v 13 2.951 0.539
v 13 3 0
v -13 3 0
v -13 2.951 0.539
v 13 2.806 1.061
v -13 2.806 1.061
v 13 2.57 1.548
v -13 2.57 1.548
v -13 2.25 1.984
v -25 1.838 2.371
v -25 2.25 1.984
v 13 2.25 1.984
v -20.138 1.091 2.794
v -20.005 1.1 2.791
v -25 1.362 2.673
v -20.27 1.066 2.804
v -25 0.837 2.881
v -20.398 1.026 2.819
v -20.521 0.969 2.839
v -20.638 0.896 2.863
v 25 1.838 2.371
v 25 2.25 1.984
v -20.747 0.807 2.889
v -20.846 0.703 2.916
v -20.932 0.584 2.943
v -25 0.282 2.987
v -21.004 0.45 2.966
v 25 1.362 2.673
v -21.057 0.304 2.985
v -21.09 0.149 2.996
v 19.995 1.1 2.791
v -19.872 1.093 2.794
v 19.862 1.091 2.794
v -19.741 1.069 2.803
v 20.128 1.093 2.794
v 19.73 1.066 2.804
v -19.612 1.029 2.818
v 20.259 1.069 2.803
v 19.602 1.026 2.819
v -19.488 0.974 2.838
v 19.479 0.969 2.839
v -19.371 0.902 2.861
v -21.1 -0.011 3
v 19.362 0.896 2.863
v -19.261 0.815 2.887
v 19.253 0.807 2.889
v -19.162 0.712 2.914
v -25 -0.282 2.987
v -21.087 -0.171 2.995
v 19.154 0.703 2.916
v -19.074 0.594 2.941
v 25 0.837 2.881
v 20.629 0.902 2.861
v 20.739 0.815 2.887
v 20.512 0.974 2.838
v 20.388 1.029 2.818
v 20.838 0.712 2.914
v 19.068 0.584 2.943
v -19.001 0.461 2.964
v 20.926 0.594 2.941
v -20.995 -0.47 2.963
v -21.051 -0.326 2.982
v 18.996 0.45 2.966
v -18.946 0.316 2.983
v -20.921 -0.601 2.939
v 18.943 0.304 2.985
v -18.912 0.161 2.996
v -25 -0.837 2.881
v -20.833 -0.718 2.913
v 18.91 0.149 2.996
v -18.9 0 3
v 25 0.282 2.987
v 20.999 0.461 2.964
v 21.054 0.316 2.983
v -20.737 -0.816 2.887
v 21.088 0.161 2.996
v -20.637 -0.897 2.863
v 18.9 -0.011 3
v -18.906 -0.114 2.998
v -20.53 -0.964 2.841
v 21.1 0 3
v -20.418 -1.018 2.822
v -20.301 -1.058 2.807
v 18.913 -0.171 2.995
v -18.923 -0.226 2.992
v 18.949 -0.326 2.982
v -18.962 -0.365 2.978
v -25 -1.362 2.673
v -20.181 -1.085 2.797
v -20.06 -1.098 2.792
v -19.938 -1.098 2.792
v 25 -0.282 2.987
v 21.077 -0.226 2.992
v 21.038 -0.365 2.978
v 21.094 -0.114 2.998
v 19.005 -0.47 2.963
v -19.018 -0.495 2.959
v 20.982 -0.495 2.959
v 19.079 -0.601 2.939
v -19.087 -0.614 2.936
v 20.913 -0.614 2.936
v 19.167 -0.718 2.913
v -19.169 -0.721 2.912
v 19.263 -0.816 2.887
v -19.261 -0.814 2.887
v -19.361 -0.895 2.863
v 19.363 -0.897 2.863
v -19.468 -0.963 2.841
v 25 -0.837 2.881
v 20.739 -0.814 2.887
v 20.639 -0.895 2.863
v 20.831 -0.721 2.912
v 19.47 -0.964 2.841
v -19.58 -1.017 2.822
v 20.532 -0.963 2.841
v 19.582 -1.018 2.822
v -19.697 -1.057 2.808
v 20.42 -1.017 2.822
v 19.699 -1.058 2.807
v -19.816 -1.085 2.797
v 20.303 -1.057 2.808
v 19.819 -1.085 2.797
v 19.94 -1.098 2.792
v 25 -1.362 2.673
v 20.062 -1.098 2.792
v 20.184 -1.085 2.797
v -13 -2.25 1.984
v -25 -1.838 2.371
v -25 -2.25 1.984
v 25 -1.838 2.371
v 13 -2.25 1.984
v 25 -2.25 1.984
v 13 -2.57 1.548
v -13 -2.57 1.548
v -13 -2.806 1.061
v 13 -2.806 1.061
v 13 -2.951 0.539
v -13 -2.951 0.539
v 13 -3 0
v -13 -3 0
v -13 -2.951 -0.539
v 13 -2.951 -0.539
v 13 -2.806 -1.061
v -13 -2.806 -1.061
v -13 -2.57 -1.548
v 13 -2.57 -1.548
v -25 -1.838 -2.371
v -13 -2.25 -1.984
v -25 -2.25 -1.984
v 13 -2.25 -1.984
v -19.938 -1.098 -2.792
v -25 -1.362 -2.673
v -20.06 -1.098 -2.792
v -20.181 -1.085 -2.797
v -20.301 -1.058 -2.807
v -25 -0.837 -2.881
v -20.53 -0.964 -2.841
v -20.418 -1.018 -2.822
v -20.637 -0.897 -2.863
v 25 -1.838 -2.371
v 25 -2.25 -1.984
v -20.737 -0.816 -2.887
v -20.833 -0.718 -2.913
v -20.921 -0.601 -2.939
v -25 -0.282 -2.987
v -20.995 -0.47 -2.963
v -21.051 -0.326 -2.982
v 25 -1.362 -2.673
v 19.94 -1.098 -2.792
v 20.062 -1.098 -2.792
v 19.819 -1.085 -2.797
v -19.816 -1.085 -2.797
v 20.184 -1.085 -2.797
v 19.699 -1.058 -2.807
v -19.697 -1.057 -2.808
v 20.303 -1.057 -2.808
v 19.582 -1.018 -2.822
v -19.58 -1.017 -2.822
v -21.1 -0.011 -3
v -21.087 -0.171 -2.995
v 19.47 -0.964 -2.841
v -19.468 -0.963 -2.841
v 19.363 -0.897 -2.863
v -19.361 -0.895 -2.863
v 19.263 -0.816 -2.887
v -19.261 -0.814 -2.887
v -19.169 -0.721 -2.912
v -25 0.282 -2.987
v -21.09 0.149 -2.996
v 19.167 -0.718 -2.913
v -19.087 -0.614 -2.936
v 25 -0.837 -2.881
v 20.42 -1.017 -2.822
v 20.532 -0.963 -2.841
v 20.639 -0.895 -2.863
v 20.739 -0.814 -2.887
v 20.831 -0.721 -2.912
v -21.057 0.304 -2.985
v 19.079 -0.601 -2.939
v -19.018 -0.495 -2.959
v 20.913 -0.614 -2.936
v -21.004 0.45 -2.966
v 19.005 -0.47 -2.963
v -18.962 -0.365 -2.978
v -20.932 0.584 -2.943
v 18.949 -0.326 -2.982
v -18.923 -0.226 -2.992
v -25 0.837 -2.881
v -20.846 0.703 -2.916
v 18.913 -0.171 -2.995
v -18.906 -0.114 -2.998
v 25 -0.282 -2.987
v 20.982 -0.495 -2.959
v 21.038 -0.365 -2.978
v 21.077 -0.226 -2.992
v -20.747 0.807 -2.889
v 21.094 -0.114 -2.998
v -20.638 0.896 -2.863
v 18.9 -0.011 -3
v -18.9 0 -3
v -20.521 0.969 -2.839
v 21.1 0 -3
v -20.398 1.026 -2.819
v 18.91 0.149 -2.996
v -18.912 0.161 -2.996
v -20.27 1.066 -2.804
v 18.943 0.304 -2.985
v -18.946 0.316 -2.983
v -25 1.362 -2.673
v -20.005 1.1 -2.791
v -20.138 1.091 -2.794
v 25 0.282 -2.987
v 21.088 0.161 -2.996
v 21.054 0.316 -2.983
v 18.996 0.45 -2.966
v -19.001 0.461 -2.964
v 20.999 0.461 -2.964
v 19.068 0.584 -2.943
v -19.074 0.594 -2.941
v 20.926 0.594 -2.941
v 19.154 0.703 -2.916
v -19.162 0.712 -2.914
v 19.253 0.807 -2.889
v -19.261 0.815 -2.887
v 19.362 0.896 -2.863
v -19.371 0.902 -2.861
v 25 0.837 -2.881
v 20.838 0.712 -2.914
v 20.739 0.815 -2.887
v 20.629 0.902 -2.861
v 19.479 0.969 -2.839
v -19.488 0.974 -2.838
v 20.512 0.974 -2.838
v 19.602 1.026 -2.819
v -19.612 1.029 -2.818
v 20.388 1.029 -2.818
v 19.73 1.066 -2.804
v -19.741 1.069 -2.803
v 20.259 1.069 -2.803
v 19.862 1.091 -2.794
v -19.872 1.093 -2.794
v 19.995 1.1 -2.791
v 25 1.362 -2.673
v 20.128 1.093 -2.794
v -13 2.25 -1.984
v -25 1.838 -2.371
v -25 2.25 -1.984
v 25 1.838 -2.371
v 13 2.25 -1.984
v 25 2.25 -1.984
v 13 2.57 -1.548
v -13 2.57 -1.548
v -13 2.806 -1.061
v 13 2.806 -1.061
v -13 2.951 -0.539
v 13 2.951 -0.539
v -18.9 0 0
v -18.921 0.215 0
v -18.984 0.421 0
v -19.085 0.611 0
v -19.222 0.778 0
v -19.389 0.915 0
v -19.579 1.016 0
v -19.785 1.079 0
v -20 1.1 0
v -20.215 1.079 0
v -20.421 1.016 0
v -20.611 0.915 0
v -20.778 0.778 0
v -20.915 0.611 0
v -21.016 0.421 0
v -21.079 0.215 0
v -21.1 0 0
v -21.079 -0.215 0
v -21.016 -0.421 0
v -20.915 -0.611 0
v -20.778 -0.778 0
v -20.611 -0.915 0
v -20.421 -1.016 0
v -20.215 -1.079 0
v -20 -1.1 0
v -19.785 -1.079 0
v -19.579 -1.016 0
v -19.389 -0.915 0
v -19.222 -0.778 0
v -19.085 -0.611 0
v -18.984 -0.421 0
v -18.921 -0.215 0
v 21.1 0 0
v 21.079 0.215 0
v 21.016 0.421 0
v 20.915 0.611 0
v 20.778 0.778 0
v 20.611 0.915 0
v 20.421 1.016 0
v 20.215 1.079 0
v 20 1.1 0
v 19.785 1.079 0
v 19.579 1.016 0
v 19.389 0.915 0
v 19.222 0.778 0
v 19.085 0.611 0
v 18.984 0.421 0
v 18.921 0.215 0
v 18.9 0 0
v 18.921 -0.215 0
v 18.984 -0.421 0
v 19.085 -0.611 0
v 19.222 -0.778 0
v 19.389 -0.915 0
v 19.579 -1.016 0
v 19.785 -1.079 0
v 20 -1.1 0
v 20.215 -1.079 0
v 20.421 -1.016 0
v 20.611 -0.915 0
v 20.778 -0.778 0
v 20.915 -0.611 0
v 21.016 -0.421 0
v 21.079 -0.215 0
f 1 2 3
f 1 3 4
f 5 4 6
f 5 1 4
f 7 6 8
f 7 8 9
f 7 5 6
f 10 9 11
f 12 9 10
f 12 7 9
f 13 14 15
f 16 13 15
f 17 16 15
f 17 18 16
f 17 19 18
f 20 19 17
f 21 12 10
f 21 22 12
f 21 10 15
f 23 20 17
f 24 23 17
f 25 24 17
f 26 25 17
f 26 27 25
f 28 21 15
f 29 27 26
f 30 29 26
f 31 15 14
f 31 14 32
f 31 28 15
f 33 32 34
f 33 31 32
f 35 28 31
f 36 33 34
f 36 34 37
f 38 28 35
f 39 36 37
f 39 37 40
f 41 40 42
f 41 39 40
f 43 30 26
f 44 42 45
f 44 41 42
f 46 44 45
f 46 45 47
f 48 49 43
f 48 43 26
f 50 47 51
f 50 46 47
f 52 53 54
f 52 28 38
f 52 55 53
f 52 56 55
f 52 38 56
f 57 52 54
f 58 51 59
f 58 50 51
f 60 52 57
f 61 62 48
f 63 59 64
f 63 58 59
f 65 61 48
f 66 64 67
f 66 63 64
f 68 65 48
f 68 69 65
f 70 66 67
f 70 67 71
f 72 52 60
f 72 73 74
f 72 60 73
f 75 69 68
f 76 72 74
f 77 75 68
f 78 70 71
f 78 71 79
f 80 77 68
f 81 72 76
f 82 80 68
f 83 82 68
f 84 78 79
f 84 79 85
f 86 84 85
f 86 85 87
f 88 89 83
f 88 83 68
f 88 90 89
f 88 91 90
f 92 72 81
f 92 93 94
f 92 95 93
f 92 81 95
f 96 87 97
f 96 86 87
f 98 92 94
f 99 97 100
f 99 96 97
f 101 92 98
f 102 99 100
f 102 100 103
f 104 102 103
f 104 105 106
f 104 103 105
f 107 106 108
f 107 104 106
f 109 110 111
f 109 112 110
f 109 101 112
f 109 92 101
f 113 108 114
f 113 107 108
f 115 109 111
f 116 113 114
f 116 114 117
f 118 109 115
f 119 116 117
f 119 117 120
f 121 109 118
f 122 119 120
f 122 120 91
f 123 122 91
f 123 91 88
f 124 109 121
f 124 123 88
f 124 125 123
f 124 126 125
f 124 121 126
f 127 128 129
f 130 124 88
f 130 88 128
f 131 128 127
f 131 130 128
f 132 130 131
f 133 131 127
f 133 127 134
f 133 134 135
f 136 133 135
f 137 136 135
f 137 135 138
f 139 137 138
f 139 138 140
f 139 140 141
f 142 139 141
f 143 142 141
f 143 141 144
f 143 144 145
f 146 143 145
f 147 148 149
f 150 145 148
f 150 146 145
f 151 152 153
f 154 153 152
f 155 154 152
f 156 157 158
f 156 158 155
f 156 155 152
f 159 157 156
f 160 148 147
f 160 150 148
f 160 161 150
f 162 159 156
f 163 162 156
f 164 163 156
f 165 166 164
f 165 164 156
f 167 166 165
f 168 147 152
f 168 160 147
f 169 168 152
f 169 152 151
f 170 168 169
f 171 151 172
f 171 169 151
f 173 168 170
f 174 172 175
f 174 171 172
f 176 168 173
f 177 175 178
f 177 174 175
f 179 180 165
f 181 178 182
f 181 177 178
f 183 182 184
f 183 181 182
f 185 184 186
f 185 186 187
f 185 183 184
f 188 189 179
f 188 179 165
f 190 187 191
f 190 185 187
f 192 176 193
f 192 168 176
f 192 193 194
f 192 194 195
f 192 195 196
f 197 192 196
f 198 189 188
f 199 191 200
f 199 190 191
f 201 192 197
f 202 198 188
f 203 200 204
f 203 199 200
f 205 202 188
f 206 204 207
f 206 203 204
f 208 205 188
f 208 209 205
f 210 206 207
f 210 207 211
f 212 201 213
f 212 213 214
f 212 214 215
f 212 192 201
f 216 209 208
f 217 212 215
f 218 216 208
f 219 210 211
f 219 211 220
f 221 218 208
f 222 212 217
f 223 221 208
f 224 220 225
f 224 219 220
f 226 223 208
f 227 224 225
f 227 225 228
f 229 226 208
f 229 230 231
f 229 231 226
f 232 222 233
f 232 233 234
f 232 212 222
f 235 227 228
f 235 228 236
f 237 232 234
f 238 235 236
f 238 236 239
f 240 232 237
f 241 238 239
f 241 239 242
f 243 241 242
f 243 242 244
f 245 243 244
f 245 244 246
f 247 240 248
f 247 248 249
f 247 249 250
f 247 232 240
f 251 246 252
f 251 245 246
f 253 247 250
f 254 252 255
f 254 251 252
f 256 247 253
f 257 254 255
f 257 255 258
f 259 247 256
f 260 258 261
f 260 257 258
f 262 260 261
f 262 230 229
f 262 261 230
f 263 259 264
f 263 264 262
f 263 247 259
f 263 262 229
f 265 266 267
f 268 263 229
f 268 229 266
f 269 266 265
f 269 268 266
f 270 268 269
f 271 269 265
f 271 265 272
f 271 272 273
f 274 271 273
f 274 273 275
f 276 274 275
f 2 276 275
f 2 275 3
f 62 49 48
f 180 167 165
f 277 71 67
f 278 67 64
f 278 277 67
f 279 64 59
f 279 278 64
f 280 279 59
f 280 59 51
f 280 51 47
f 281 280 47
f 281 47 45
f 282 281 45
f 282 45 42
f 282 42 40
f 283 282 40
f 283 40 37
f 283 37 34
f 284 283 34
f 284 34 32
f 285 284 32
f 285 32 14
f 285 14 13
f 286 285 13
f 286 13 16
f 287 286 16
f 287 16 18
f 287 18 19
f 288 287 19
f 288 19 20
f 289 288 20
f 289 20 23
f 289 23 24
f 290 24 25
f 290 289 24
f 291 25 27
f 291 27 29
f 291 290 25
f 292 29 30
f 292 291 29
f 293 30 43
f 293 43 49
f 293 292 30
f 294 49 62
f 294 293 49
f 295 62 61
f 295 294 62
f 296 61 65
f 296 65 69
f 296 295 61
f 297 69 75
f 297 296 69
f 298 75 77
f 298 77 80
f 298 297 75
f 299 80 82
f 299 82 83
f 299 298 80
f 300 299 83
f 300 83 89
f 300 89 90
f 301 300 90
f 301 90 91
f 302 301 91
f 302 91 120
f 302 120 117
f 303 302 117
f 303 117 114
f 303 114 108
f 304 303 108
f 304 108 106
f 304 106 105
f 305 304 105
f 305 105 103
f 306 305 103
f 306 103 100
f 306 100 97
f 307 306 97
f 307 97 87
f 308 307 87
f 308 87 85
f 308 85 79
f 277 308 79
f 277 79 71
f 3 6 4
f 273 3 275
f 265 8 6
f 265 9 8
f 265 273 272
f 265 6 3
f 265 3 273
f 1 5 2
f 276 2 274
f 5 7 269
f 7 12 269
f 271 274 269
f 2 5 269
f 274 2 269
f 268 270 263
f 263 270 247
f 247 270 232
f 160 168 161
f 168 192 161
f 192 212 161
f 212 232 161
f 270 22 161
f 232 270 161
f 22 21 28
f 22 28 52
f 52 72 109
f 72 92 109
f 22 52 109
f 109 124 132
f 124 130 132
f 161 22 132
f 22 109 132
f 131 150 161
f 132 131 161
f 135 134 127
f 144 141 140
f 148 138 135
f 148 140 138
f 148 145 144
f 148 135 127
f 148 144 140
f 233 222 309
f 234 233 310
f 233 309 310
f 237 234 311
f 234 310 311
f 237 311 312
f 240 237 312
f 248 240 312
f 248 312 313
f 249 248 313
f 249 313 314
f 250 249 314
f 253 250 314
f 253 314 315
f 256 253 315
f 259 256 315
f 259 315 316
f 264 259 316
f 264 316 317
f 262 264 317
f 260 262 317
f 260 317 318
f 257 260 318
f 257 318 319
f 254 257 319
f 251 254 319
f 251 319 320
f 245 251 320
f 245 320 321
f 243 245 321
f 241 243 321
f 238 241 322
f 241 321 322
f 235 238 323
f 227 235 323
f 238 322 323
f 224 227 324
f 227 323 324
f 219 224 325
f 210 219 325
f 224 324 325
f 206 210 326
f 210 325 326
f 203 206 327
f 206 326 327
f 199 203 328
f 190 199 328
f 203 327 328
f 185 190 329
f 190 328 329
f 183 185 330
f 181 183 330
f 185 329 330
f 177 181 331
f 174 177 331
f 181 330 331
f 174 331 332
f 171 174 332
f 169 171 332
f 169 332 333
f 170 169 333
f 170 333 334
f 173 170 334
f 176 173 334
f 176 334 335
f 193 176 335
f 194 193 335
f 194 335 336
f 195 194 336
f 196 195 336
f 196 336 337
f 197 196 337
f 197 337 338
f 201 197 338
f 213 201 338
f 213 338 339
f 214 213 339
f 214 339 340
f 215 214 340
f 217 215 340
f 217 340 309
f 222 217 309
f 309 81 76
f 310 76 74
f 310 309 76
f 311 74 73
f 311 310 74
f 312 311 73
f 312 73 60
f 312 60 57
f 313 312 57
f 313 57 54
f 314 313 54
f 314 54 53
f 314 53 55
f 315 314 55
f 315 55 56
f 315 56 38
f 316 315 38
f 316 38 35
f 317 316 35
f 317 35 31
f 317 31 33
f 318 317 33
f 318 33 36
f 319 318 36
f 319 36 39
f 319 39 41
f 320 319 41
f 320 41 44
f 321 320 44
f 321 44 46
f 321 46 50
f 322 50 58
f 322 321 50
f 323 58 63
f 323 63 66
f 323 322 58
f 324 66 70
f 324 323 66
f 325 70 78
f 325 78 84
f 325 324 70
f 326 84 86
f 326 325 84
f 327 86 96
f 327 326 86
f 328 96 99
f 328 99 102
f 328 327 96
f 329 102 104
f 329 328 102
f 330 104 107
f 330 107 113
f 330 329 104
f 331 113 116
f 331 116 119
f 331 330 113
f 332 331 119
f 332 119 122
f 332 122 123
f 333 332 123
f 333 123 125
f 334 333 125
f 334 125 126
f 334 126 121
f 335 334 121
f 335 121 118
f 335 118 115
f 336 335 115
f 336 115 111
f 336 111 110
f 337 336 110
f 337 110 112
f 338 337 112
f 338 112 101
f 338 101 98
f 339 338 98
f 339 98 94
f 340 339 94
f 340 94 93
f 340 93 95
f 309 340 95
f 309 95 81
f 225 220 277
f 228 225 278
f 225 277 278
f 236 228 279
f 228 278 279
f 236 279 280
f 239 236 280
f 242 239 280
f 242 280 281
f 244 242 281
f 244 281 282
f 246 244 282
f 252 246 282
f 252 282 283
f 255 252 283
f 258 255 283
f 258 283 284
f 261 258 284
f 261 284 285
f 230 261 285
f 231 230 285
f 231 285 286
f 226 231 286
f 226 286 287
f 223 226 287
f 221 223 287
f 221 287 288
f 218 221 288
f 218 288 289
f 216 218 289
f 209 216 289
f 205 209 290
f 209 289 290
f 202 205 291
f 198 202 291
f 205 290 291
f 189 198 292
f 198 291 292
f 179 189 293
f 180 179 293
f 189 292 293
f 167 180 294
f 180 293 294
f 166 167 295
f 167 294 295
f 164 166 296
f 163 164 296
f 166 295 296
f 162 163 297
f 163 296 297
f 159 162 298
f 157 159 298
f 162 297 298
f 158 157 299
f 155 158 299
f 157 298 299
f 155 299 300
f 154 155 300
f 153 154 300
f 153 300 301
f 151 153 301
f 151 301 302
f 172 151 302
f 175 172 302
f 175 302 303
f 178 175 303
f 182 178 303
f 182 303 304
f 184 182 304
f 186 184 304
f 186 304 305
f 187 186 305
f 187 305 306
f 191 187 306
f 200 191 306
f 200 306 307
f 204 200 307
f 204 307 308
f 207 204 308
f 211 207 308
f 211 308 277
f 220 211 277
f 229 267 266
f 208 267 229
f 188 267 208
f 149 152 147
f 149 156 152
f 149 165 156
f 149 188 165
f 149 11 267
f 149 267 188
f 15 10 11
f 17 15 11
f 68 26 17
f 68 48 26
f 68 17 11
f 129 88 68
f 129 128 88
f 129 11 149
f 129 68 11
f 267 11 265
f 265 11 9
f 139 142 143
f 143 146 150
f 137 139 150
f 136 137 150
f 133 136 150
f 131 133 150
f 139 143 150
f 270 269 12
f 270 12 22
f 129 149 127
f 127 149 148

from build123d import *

# Parameters (mm, degrees)
SKETCH1_W               = 50
SKETCH1_H               = 3
SKETCH2_W               = 12
SKETCH2_H               = 0.75
CUT_EXTRUDE1_DEPTH      = 4
CUT_EXTRUDE1_DEPTH_BACK = 4
SKETCH3_R               = 1.1
CUT_EXTRUDE2_DEPTH      = 4
CUT_EXTRUDE2_DEPTH_BACK = 4


with BuildPart() as part:
    # Sketch1 → Revolve1 (revolve)
    with BuildSketch(Plane.XY):
        with Locations((0, 1.5)):
            Rectangle(SKETCH1_W, SKETCH1_H)
    revolve(axis=Axis((0, 0, 0), (1, 0, 0)))

    # Sketch2 → Cut-Extrude1 (cut, two sides)
    with BuildSketch(Plane.XY) as cut_extrude1_sk:
        with Locations((-19, 2.625)):
            Rectangle(SKETCH2_W, SKETCH2_H)
        with Locations((-19, -2.625)):
            Rectangle(SKETCH2_W, SKETCH2_H)
        with Locations((19, 2.625)):
            Rectangle(SKETCH2_W, SKETCH2_H)
        with Locations((19, -2.625)):
            Rectangle(SKETCH2_W, SKETCH2_H)
    extrude(amount=CUT_EXTRUDE1_DEPTH, mode=Mode.SUBTRACT)
    extrude(cut_extrude1_sk.sketch, amount=-CUT_EXTRUDE1_DEPTH_BACK, mode=Mode.SUBTRACT)

    # Sketch3 → Cut-Extrude2 (cut, two sides)
    with BuildSketch(Plane.XY) as cut_extrude2_sk:
        with Locations((-20, 0)):
            Circle(SKETCH3_R)
        with Locations((20, 0)):
            Circle(SKETCH3_R)
    extrude(amount=CUT_EXTRUDE2_DEPTH, mode=Mode.SUBTRACT)
    extrude(cut_extrude2_sk.sketch, amount=-CUT_EXTRUDE2_DEPTH_BACK, mode=Mode.SUBTRACT)


solid = part.part
